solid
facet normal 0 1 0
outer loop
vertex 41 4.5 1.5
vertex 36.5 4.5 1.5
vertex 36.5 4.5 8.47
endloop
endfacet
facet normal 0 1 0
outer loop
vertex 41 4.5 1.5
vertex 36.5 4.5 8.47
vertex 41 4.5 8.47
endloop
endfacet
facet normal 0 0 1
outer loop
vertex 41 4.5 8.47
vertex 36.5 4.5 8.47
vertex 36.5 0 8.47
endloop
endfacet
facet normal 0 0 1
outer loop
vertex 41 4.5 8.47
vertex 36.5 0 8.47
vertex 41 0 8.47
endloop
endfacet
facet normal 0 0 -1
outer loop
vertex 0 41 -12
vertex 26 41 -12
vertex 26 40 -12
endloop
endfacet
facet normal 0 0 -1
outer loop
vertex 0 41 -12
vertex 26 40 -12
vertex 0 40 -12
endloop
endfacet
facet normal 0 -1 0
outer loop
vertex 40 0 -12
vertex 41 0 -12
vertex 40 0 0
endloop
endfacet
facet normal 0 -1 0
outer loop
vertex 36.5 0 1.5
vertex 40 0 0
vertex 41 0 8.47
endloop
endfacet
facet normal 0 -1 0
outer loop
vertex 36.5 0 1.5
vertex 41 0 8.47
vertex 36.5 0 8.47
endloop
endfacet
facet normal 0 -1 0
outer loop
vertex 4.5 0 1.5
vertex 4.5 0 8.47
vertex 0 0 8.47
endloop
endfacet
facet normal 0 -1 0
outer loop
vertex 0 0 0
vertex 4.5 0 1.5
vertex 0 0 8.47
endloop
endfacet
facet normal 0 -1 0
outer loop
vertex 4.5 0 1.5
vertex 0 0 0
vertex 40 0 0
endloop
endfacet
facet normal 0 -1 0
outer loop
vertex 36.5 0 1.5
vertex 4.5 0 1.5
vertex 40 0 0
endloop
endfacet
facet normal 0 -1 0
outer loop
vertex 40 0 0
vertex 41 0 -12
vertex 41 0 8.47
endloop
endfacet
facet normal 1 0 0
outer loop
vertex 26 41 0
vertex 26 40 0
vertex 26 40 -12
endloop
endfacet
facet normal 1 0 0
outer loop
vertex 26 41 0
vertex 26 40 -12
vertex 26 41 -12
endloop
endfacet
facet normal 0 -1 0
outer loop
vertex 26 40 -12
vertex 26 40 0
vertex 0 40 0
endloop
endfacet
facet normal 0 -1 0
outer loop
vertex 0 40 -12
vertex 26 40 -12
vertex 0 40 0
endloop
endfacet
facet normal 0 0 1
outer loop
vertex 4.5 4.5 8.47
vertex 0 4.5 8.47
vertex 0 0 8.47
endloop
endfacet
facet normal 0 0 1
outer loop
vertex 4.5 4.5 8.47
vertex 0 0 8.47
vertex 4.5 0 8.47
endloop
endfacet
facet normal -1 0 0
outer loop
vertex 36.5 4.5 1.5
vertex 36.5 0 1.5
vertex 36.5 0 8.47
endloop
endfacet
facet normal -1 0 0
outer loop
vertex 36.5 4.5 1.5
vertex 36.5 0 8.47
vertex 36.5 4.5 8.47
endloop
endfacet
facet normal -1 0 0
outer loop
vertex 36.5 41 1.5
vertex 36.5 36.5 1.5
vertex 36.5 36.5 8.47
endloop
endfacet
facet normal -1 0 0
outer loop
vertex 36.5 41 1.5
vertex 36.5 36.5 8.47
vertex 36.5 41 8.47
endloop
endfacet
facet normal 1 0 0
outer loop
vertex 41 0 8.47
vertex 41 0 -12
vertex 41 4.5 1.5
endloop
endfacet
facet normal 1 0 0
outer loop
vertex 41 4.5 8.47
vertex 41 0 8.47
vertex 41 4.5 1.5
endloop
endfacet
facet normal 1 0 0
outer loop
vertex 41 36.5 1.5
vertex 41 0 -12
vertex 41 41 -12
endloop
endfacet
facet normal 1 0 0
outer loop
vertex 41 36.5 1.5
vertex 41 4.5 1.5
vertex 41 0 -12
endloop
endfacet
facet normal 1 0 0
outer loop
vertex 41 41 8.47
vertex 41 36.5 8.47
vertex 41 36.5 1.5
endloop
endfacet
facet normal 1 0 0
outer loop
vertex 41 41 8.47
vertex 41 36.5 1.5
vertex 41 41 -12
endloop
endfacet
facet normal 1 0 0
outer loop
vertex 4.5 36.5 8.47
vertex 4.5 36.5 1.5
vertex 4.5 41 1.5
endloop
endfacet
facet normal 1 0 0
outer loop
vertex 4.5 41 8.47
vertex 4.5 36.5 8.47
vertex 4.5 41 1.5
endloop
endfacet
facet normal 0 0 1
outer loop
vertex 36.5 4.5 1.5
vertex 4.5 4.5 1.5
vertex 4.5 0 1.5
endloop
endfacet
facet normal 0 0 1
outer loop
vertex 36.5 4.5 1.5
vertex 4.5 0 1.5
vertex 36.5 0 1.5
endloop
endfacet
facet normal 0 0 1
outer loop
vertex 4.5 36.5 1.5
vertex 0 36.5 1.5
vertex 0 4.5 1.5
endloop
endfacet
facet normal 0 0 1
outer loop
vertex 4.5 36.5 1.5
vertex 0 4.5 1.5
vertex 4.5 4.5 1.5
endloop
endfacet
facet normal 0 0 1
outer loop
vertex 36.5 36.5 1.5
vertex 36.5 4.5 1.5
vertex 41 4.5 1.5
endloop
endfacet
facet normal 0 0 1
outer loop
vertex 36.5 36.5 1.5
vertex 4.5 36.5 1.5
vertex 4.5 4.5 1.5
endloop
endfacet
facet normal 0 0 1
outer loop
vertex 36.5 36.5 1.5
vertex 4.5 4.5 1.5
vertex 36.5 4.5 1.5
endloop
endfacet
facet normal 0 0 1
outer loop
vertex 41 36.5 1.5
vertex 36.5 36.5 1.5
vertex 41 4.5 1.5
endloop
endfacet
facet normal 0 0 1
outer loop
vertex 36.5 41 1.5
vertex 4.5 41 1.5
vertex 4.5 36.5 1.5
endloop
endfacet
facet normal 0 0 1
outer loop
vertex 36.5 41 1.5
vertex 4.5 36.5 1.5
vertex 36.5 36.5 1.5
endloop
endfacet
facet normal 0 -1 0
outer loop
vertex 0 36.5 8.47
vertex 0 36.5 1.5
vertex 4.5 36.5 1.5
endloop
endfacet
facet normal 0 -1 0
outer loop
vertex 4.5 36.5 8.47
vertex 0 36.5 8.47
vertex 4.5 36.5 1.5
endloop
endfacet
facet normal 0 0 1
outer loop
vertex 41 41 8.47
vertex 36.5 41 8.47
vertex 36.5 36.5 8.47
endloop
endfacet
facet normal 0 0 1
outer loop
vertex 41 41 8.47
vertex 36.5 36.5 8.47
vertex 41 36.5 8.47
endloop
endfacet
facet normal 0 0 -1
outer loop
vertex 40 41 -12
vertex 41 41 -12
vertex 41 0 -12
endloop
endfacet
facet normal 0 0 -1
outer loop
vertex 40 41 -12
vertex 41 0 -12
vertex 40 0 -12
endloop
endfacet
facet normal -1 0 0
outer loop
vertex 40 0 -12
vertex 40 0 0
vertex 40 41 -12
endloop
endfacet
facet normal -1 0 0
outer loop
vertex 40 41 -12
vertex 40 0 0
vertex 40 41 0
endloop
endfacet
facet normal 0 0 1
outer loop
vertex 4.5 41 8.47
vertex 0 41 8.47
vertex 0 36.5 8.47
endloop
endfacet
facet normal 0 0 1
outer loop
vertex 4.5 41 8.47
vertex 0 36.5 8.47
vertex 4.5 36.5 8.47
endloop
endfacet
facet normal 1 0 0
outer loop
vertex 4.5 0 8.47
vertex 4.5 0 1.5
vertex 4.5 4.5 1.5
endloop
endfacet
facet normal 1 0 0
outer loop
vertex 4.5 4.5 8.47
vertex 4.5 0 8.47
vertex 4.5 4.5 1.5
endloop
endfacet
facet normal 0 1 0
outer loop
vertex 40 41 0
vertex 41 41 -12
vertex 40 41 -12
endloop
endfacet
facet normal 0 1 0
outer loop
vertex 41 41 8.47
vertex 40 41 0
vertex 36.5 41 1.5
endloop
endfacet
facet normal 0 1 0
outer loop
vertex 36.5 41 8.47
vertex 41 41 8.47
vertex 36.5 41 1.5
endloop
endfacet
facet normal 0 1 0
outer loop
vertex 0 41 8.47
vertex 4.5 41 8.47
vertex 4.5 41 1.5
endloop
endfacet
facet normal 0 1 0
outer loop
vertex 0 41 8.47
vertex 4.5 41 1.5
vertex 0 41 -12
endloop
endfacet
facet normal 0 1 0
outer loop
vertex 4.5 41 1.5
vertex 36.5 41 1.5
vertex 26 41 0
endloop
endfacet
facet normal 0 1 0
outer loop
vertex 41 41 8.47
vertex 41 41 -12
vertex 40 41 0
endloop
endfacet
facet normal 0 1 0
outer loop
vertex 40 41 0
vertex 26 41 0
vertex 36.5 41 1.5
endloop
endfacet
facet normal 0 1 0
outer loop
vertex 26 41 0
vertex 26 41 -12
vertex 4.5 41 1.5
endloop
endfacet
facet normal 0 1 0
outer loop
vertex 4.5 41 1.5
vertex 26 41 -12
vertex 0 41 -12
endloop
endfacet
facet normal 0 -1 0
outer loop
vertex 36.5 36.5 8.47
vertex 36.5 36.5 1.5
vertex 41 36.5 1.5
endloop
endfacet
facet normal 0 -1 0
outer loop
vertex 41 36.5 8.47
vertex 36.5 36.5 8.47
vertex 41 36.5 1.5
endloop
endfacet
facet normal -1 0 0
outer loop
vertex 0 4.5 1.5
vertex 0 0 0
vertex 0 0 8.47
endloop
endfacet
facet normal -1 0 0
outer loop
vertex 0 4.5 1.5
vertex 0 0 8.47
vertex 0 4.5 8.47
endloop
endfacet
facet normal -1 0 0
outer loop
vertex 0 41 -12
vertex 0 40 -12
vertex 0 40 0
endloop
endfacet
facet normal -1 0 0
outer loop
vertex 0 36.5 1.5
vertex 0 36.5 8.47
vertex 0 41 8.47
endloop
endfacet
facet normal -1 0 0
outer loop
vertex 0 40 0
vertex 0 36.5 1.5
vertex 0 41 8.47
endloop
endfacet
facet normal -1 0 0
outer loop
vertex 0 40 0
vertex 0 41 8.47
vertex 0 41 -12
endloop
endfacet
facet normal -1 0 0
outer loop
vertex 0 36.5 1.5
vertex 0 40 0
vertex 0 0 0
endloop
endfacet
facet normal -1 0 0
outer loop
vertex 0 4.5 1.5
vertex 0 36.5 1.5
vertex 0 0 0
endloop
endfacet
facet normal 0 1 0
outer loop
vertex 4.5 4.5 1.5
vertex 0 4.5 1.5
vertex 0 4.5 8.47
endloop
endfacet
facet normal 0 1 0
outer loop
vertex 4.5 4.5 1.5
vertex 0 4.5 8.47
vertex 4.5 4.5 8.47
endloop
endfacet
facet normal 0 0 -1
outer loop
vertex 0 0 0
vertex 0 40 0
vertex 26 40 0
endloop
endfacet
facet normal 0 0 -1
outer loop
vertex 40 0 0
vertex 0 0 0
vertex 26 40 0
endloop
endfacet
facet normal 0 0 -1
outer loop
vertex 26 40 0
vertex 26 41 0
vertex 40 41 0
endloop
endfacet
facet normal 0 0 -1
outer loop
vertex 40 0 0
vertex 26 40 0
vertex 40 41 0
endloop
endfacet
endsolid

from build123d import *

# Parameters (mm, degrees)
SCHIZZO1_W                   = 41
SCHIZZO1_H                   = 41
ESTRUSIONE_ESTRUSIONE1_DEPTH = 1.5
SCHIZZO5_W                   = 4.5
SCHIZZO5_H                   = 4.5
ESTRUSIONE_ESTRUSIONE2_DEPTH = 6.97
SCHIZZO6_W                   = 4.5
SCHIZZO6_H                   = 4.5
ESTRUSIONE_ESTRUSIONE3_DEPTH = 6.97
SCHIZZO7_W                   = 4.5
SCHIZZO7_H                   = 4.5
ESTRUSIONE_ESTRUSIONE4_DEPTH = 6.97
SCHIZZO8_W                   = 4.5
SCHIZZO8_H                   = 4.5
ESTRUSIONE_ESTRUSIONE5_DEPTH = 6.97
SCHIZZO9_W                   = 1
SCHIZZO9_H                   = 41
ESTRUSIONE_ESTRUSIONE6_DEPTH = 12
SCHIZZO10_W                  = 26
SCHIZZO10_H                  = 1
ESTRUSIONE_ESTRUSIONE7_DEPTH = 12
SCHIZZO11_R                  = 0.4
TAGLIO_ESTRUSIONE1_DEPTH     = 10
SCHIZZO12_R                  = 0.4
TAGLIO_ESTRUSIONE2_DEPTH     = 10


with BuildPart() as part:
    # Schizzo1 → Estrusione-Estrusione1 (new body)
    with BuildSketch(Plane.XY):
        with Locations((20.5, 20.5)):
            Rectangle(SCHIZZO1_W, SCHIZZO1_H)
    extrude(amount=ESTRUSIONE_ESTRUSIONE1_DEPTH)

    # Schizzo5 → Estrusione-Estrusione2 (add)
    with BuildSketch(Plane.XY.offset(1.5)):
        with Locations((2.25, 2.25)):
            Rectangle(SCHIZZO5_W, SCHIZZO5_H)
    extrude(amount=ESTRUSIONE_ESTRUSIONE2_DEPTH)

    # Schizzo6 → Estrusione-Estrusione3 (add)
    with BuildSketch(Plane.XY.offset(1.5)):
        with Locations((38.75, 2.25)):
            Rectangle(SCHIZZO6_W, SCHIZZO6_H)
    extrude(amount=ESTRUSIONE_ESTRUSIONE3_DEPTH)

    # Schizzo7 → Estrusione-Estrusione4 (add)
    with BuildSketch(Plane.XY.offset(1.5)):
        with Locations((2.25, 38.75)):
            Rectangle(SCHIZZO7_W, SCHIZZO7_H)
    extrude(amount=ESTRUSIONE_ESTRUSIONE4_DEPTH)

    # Schizzo8 → Estrusione-Estrusione5 (add)
    with BuildSketch(Plane.XY.offset(1.5)):
        with Locations((38.75, 38.75)):
            Rectangle(SCHIZZO8_W, SCHIZZO8_H)
    extrude(amount=ESTRUSIONE_ESTRUSIONE5_DEPTH)

    # Schizzo9 → Estrusione-Estrusione6 (add)
    with BuildSketch(Plane(origin=(0, 0, 0), x_dir=(-1, 0, 0), z_dir=(0, 0, -1))):
        with Locations((-40.5, 20.5)):
            Rectangle(SCHIZZO9_W, SCHIZZO9_H)
    extrude(amount=ESTRUSIONE_ESTRUSIONE6_DEPTH)

    # Schizzo10 → Estrusione-Estrusione7 (add)
    with BuildSketch(Plane(origin=(0, 0, 0), x_dir=(-1, 0, 0), z_dir=(0, 0, -1))):
        with Locations((-13, 40.5)):
            Rectangle(SCHIZZO10_W, SCHIZZO10_H)
    extrude(amount=ESTRUSIONE_ESTRUSIONE7_DEPTH)

    # Schizzo11 → Taglio-Estrusione1 (cut)
    with BuildSketch(Plane.XY.offset(8.47)):
        with Locations((32.781075858, 214.49933813)):
            Circle(SCHIZZO11_R)
    extrude(amount=-TAGLIO_ESTRUSIONE1_DEPTH, mode=Mode.SUBTRACT)

    # Schizzo12 → Taglio-Estrusione2 (cut)
    with BuildSketch(Plane.XY.offset(8.47)):
        with Locations((-3.518924142, 178.29933813)):
            Circle(SCHIZZO12_R)
    extrude(amount=-TAGLIO_ESTRUSIONE2_DEPTH, mode=Mode.SUBTRACT)


solid = part.part
